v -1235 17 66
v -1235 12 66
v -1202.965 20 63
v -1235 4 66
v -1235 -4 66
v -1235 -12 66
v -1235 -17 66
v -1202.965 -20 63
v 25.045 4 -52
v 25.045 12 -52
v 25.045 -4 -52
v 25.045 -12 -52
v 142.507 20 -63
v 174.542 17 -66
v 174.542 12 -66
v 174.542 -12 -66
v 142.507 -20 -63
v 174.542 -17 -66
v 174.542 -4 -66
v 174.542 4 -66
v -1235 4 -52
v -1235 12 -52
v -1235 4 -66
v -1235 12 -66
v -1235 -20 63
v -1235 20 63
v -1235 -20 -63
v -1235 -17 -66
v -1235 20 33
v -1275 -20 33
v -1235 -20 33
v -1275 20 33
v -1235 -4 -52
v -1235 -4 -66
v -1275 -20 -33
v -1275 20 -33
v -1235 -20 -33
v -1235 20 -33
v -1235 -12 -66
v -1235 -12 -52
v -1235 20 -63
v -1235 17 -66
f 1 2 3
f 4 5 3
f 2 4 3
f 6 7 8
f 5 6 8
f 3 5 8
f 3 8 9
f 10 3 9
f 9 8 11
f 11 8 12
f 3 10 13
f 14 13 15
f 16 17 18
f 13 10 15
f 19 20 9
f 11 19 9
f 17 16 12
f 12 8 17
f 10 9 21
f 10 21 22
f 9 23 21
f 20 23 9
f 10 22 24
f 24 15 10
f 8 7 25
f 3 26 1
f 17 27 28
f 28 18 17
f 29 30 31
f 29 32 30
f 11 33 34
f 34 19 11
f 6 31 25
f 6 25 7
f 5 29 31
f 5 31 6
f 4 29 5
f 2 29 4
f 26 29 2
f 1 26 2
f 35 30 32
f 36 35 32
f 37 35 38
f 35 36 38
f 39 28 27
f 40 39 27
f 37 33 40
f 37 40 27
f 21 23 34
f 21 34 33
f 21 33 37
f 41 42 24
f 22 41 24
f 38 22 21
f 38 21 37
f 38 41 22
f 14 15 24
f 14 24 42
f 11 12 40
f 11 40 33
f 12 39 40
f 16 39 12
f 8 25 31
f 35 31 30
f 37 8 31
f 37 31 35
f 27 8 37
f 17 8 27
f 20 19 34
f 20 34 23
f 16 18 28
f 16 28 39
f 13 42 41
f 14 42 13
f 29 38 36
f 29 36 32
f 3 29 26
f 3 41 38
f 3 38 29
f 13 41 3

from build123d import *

# Parameters (mm, degrees)
F1_W     = 40
F1_H     = 33
F3_DEPTH = 1275
F2_W     = 80
F2_H     = 100
F4_DEPTH = 25
F6_DEPTH = 50


with BuildPart() as f3:
    # F1 (on Right) → F3 (new body, symmetric)
    with BuildSketch(Plane.YZ):
        Polygon((20, 33), (20, 63), (17, 66), (12, 66), (12, 80), (4, 80), (4, 66), (-4, 66), (-4, 80), (-12, 80), (-12, 66), (-17, 66), (-20, 63), (-20, 33), align=None)
        with Locations((0, 16.5)):
            Rectangle(F1_W, F1_H)
        with Locations((0, -16.5)):
            Rectangle(F1_W, F1_H)
        Polygon((20, -63), (20, -33), (-20, -33), (-20, -63), (-17, -66), (-12, -66), (-12, -52), (-4, -52), (-4, -66), (4, -66), (4, -52), (12, -52), (12, -66), (17, -66), align=None)
    extrude(amount=F3_DEPTH, both=True)

    # F2 (on Front) → F4 (cut, symmetric)
    with BuildSketch(Plane.XZ):
        with Locations((-1275, 83)):
            Rectangle(F2_W, F2_H)
        with Locations((-1275, -83)):
            Rectangle(F2_W, F2_H)
        with Locations((1275, 83)):
            Rectangle(F2_W, F2_H)
        with Locations((1275, -83)):
            Rectangle(F2_W, F2_H)
    extrude(amount=F4_DEPTH, both=True, mode=Mode.SUBTRACT)

    # F5 (on face) → F6 (cut, symmetric)
    with BuildSketch(Plane.XZ.offset(20)):
        Polygon((1525, 88.4753859), (-1475, 88.4753859), (-1202.9649549421, 63), (1235, 63), (1235, 33), (1275, 33), (1275, -33), (1235, -33), (1235, -63), (142.5069374912, -63), (1525, -192.4669378497), align=None)
        Polygon((1235, 63), (-1202.9649549421, 63), (142.5069374912, -63), (1235, -63), (1235, -33), (1275, -33), (1275, 33), (1235, 33), align=None)
    extrude(amount=F6_DEPTH, both=True, mode=Mode.SUBTRACT)


solid = f3.part
